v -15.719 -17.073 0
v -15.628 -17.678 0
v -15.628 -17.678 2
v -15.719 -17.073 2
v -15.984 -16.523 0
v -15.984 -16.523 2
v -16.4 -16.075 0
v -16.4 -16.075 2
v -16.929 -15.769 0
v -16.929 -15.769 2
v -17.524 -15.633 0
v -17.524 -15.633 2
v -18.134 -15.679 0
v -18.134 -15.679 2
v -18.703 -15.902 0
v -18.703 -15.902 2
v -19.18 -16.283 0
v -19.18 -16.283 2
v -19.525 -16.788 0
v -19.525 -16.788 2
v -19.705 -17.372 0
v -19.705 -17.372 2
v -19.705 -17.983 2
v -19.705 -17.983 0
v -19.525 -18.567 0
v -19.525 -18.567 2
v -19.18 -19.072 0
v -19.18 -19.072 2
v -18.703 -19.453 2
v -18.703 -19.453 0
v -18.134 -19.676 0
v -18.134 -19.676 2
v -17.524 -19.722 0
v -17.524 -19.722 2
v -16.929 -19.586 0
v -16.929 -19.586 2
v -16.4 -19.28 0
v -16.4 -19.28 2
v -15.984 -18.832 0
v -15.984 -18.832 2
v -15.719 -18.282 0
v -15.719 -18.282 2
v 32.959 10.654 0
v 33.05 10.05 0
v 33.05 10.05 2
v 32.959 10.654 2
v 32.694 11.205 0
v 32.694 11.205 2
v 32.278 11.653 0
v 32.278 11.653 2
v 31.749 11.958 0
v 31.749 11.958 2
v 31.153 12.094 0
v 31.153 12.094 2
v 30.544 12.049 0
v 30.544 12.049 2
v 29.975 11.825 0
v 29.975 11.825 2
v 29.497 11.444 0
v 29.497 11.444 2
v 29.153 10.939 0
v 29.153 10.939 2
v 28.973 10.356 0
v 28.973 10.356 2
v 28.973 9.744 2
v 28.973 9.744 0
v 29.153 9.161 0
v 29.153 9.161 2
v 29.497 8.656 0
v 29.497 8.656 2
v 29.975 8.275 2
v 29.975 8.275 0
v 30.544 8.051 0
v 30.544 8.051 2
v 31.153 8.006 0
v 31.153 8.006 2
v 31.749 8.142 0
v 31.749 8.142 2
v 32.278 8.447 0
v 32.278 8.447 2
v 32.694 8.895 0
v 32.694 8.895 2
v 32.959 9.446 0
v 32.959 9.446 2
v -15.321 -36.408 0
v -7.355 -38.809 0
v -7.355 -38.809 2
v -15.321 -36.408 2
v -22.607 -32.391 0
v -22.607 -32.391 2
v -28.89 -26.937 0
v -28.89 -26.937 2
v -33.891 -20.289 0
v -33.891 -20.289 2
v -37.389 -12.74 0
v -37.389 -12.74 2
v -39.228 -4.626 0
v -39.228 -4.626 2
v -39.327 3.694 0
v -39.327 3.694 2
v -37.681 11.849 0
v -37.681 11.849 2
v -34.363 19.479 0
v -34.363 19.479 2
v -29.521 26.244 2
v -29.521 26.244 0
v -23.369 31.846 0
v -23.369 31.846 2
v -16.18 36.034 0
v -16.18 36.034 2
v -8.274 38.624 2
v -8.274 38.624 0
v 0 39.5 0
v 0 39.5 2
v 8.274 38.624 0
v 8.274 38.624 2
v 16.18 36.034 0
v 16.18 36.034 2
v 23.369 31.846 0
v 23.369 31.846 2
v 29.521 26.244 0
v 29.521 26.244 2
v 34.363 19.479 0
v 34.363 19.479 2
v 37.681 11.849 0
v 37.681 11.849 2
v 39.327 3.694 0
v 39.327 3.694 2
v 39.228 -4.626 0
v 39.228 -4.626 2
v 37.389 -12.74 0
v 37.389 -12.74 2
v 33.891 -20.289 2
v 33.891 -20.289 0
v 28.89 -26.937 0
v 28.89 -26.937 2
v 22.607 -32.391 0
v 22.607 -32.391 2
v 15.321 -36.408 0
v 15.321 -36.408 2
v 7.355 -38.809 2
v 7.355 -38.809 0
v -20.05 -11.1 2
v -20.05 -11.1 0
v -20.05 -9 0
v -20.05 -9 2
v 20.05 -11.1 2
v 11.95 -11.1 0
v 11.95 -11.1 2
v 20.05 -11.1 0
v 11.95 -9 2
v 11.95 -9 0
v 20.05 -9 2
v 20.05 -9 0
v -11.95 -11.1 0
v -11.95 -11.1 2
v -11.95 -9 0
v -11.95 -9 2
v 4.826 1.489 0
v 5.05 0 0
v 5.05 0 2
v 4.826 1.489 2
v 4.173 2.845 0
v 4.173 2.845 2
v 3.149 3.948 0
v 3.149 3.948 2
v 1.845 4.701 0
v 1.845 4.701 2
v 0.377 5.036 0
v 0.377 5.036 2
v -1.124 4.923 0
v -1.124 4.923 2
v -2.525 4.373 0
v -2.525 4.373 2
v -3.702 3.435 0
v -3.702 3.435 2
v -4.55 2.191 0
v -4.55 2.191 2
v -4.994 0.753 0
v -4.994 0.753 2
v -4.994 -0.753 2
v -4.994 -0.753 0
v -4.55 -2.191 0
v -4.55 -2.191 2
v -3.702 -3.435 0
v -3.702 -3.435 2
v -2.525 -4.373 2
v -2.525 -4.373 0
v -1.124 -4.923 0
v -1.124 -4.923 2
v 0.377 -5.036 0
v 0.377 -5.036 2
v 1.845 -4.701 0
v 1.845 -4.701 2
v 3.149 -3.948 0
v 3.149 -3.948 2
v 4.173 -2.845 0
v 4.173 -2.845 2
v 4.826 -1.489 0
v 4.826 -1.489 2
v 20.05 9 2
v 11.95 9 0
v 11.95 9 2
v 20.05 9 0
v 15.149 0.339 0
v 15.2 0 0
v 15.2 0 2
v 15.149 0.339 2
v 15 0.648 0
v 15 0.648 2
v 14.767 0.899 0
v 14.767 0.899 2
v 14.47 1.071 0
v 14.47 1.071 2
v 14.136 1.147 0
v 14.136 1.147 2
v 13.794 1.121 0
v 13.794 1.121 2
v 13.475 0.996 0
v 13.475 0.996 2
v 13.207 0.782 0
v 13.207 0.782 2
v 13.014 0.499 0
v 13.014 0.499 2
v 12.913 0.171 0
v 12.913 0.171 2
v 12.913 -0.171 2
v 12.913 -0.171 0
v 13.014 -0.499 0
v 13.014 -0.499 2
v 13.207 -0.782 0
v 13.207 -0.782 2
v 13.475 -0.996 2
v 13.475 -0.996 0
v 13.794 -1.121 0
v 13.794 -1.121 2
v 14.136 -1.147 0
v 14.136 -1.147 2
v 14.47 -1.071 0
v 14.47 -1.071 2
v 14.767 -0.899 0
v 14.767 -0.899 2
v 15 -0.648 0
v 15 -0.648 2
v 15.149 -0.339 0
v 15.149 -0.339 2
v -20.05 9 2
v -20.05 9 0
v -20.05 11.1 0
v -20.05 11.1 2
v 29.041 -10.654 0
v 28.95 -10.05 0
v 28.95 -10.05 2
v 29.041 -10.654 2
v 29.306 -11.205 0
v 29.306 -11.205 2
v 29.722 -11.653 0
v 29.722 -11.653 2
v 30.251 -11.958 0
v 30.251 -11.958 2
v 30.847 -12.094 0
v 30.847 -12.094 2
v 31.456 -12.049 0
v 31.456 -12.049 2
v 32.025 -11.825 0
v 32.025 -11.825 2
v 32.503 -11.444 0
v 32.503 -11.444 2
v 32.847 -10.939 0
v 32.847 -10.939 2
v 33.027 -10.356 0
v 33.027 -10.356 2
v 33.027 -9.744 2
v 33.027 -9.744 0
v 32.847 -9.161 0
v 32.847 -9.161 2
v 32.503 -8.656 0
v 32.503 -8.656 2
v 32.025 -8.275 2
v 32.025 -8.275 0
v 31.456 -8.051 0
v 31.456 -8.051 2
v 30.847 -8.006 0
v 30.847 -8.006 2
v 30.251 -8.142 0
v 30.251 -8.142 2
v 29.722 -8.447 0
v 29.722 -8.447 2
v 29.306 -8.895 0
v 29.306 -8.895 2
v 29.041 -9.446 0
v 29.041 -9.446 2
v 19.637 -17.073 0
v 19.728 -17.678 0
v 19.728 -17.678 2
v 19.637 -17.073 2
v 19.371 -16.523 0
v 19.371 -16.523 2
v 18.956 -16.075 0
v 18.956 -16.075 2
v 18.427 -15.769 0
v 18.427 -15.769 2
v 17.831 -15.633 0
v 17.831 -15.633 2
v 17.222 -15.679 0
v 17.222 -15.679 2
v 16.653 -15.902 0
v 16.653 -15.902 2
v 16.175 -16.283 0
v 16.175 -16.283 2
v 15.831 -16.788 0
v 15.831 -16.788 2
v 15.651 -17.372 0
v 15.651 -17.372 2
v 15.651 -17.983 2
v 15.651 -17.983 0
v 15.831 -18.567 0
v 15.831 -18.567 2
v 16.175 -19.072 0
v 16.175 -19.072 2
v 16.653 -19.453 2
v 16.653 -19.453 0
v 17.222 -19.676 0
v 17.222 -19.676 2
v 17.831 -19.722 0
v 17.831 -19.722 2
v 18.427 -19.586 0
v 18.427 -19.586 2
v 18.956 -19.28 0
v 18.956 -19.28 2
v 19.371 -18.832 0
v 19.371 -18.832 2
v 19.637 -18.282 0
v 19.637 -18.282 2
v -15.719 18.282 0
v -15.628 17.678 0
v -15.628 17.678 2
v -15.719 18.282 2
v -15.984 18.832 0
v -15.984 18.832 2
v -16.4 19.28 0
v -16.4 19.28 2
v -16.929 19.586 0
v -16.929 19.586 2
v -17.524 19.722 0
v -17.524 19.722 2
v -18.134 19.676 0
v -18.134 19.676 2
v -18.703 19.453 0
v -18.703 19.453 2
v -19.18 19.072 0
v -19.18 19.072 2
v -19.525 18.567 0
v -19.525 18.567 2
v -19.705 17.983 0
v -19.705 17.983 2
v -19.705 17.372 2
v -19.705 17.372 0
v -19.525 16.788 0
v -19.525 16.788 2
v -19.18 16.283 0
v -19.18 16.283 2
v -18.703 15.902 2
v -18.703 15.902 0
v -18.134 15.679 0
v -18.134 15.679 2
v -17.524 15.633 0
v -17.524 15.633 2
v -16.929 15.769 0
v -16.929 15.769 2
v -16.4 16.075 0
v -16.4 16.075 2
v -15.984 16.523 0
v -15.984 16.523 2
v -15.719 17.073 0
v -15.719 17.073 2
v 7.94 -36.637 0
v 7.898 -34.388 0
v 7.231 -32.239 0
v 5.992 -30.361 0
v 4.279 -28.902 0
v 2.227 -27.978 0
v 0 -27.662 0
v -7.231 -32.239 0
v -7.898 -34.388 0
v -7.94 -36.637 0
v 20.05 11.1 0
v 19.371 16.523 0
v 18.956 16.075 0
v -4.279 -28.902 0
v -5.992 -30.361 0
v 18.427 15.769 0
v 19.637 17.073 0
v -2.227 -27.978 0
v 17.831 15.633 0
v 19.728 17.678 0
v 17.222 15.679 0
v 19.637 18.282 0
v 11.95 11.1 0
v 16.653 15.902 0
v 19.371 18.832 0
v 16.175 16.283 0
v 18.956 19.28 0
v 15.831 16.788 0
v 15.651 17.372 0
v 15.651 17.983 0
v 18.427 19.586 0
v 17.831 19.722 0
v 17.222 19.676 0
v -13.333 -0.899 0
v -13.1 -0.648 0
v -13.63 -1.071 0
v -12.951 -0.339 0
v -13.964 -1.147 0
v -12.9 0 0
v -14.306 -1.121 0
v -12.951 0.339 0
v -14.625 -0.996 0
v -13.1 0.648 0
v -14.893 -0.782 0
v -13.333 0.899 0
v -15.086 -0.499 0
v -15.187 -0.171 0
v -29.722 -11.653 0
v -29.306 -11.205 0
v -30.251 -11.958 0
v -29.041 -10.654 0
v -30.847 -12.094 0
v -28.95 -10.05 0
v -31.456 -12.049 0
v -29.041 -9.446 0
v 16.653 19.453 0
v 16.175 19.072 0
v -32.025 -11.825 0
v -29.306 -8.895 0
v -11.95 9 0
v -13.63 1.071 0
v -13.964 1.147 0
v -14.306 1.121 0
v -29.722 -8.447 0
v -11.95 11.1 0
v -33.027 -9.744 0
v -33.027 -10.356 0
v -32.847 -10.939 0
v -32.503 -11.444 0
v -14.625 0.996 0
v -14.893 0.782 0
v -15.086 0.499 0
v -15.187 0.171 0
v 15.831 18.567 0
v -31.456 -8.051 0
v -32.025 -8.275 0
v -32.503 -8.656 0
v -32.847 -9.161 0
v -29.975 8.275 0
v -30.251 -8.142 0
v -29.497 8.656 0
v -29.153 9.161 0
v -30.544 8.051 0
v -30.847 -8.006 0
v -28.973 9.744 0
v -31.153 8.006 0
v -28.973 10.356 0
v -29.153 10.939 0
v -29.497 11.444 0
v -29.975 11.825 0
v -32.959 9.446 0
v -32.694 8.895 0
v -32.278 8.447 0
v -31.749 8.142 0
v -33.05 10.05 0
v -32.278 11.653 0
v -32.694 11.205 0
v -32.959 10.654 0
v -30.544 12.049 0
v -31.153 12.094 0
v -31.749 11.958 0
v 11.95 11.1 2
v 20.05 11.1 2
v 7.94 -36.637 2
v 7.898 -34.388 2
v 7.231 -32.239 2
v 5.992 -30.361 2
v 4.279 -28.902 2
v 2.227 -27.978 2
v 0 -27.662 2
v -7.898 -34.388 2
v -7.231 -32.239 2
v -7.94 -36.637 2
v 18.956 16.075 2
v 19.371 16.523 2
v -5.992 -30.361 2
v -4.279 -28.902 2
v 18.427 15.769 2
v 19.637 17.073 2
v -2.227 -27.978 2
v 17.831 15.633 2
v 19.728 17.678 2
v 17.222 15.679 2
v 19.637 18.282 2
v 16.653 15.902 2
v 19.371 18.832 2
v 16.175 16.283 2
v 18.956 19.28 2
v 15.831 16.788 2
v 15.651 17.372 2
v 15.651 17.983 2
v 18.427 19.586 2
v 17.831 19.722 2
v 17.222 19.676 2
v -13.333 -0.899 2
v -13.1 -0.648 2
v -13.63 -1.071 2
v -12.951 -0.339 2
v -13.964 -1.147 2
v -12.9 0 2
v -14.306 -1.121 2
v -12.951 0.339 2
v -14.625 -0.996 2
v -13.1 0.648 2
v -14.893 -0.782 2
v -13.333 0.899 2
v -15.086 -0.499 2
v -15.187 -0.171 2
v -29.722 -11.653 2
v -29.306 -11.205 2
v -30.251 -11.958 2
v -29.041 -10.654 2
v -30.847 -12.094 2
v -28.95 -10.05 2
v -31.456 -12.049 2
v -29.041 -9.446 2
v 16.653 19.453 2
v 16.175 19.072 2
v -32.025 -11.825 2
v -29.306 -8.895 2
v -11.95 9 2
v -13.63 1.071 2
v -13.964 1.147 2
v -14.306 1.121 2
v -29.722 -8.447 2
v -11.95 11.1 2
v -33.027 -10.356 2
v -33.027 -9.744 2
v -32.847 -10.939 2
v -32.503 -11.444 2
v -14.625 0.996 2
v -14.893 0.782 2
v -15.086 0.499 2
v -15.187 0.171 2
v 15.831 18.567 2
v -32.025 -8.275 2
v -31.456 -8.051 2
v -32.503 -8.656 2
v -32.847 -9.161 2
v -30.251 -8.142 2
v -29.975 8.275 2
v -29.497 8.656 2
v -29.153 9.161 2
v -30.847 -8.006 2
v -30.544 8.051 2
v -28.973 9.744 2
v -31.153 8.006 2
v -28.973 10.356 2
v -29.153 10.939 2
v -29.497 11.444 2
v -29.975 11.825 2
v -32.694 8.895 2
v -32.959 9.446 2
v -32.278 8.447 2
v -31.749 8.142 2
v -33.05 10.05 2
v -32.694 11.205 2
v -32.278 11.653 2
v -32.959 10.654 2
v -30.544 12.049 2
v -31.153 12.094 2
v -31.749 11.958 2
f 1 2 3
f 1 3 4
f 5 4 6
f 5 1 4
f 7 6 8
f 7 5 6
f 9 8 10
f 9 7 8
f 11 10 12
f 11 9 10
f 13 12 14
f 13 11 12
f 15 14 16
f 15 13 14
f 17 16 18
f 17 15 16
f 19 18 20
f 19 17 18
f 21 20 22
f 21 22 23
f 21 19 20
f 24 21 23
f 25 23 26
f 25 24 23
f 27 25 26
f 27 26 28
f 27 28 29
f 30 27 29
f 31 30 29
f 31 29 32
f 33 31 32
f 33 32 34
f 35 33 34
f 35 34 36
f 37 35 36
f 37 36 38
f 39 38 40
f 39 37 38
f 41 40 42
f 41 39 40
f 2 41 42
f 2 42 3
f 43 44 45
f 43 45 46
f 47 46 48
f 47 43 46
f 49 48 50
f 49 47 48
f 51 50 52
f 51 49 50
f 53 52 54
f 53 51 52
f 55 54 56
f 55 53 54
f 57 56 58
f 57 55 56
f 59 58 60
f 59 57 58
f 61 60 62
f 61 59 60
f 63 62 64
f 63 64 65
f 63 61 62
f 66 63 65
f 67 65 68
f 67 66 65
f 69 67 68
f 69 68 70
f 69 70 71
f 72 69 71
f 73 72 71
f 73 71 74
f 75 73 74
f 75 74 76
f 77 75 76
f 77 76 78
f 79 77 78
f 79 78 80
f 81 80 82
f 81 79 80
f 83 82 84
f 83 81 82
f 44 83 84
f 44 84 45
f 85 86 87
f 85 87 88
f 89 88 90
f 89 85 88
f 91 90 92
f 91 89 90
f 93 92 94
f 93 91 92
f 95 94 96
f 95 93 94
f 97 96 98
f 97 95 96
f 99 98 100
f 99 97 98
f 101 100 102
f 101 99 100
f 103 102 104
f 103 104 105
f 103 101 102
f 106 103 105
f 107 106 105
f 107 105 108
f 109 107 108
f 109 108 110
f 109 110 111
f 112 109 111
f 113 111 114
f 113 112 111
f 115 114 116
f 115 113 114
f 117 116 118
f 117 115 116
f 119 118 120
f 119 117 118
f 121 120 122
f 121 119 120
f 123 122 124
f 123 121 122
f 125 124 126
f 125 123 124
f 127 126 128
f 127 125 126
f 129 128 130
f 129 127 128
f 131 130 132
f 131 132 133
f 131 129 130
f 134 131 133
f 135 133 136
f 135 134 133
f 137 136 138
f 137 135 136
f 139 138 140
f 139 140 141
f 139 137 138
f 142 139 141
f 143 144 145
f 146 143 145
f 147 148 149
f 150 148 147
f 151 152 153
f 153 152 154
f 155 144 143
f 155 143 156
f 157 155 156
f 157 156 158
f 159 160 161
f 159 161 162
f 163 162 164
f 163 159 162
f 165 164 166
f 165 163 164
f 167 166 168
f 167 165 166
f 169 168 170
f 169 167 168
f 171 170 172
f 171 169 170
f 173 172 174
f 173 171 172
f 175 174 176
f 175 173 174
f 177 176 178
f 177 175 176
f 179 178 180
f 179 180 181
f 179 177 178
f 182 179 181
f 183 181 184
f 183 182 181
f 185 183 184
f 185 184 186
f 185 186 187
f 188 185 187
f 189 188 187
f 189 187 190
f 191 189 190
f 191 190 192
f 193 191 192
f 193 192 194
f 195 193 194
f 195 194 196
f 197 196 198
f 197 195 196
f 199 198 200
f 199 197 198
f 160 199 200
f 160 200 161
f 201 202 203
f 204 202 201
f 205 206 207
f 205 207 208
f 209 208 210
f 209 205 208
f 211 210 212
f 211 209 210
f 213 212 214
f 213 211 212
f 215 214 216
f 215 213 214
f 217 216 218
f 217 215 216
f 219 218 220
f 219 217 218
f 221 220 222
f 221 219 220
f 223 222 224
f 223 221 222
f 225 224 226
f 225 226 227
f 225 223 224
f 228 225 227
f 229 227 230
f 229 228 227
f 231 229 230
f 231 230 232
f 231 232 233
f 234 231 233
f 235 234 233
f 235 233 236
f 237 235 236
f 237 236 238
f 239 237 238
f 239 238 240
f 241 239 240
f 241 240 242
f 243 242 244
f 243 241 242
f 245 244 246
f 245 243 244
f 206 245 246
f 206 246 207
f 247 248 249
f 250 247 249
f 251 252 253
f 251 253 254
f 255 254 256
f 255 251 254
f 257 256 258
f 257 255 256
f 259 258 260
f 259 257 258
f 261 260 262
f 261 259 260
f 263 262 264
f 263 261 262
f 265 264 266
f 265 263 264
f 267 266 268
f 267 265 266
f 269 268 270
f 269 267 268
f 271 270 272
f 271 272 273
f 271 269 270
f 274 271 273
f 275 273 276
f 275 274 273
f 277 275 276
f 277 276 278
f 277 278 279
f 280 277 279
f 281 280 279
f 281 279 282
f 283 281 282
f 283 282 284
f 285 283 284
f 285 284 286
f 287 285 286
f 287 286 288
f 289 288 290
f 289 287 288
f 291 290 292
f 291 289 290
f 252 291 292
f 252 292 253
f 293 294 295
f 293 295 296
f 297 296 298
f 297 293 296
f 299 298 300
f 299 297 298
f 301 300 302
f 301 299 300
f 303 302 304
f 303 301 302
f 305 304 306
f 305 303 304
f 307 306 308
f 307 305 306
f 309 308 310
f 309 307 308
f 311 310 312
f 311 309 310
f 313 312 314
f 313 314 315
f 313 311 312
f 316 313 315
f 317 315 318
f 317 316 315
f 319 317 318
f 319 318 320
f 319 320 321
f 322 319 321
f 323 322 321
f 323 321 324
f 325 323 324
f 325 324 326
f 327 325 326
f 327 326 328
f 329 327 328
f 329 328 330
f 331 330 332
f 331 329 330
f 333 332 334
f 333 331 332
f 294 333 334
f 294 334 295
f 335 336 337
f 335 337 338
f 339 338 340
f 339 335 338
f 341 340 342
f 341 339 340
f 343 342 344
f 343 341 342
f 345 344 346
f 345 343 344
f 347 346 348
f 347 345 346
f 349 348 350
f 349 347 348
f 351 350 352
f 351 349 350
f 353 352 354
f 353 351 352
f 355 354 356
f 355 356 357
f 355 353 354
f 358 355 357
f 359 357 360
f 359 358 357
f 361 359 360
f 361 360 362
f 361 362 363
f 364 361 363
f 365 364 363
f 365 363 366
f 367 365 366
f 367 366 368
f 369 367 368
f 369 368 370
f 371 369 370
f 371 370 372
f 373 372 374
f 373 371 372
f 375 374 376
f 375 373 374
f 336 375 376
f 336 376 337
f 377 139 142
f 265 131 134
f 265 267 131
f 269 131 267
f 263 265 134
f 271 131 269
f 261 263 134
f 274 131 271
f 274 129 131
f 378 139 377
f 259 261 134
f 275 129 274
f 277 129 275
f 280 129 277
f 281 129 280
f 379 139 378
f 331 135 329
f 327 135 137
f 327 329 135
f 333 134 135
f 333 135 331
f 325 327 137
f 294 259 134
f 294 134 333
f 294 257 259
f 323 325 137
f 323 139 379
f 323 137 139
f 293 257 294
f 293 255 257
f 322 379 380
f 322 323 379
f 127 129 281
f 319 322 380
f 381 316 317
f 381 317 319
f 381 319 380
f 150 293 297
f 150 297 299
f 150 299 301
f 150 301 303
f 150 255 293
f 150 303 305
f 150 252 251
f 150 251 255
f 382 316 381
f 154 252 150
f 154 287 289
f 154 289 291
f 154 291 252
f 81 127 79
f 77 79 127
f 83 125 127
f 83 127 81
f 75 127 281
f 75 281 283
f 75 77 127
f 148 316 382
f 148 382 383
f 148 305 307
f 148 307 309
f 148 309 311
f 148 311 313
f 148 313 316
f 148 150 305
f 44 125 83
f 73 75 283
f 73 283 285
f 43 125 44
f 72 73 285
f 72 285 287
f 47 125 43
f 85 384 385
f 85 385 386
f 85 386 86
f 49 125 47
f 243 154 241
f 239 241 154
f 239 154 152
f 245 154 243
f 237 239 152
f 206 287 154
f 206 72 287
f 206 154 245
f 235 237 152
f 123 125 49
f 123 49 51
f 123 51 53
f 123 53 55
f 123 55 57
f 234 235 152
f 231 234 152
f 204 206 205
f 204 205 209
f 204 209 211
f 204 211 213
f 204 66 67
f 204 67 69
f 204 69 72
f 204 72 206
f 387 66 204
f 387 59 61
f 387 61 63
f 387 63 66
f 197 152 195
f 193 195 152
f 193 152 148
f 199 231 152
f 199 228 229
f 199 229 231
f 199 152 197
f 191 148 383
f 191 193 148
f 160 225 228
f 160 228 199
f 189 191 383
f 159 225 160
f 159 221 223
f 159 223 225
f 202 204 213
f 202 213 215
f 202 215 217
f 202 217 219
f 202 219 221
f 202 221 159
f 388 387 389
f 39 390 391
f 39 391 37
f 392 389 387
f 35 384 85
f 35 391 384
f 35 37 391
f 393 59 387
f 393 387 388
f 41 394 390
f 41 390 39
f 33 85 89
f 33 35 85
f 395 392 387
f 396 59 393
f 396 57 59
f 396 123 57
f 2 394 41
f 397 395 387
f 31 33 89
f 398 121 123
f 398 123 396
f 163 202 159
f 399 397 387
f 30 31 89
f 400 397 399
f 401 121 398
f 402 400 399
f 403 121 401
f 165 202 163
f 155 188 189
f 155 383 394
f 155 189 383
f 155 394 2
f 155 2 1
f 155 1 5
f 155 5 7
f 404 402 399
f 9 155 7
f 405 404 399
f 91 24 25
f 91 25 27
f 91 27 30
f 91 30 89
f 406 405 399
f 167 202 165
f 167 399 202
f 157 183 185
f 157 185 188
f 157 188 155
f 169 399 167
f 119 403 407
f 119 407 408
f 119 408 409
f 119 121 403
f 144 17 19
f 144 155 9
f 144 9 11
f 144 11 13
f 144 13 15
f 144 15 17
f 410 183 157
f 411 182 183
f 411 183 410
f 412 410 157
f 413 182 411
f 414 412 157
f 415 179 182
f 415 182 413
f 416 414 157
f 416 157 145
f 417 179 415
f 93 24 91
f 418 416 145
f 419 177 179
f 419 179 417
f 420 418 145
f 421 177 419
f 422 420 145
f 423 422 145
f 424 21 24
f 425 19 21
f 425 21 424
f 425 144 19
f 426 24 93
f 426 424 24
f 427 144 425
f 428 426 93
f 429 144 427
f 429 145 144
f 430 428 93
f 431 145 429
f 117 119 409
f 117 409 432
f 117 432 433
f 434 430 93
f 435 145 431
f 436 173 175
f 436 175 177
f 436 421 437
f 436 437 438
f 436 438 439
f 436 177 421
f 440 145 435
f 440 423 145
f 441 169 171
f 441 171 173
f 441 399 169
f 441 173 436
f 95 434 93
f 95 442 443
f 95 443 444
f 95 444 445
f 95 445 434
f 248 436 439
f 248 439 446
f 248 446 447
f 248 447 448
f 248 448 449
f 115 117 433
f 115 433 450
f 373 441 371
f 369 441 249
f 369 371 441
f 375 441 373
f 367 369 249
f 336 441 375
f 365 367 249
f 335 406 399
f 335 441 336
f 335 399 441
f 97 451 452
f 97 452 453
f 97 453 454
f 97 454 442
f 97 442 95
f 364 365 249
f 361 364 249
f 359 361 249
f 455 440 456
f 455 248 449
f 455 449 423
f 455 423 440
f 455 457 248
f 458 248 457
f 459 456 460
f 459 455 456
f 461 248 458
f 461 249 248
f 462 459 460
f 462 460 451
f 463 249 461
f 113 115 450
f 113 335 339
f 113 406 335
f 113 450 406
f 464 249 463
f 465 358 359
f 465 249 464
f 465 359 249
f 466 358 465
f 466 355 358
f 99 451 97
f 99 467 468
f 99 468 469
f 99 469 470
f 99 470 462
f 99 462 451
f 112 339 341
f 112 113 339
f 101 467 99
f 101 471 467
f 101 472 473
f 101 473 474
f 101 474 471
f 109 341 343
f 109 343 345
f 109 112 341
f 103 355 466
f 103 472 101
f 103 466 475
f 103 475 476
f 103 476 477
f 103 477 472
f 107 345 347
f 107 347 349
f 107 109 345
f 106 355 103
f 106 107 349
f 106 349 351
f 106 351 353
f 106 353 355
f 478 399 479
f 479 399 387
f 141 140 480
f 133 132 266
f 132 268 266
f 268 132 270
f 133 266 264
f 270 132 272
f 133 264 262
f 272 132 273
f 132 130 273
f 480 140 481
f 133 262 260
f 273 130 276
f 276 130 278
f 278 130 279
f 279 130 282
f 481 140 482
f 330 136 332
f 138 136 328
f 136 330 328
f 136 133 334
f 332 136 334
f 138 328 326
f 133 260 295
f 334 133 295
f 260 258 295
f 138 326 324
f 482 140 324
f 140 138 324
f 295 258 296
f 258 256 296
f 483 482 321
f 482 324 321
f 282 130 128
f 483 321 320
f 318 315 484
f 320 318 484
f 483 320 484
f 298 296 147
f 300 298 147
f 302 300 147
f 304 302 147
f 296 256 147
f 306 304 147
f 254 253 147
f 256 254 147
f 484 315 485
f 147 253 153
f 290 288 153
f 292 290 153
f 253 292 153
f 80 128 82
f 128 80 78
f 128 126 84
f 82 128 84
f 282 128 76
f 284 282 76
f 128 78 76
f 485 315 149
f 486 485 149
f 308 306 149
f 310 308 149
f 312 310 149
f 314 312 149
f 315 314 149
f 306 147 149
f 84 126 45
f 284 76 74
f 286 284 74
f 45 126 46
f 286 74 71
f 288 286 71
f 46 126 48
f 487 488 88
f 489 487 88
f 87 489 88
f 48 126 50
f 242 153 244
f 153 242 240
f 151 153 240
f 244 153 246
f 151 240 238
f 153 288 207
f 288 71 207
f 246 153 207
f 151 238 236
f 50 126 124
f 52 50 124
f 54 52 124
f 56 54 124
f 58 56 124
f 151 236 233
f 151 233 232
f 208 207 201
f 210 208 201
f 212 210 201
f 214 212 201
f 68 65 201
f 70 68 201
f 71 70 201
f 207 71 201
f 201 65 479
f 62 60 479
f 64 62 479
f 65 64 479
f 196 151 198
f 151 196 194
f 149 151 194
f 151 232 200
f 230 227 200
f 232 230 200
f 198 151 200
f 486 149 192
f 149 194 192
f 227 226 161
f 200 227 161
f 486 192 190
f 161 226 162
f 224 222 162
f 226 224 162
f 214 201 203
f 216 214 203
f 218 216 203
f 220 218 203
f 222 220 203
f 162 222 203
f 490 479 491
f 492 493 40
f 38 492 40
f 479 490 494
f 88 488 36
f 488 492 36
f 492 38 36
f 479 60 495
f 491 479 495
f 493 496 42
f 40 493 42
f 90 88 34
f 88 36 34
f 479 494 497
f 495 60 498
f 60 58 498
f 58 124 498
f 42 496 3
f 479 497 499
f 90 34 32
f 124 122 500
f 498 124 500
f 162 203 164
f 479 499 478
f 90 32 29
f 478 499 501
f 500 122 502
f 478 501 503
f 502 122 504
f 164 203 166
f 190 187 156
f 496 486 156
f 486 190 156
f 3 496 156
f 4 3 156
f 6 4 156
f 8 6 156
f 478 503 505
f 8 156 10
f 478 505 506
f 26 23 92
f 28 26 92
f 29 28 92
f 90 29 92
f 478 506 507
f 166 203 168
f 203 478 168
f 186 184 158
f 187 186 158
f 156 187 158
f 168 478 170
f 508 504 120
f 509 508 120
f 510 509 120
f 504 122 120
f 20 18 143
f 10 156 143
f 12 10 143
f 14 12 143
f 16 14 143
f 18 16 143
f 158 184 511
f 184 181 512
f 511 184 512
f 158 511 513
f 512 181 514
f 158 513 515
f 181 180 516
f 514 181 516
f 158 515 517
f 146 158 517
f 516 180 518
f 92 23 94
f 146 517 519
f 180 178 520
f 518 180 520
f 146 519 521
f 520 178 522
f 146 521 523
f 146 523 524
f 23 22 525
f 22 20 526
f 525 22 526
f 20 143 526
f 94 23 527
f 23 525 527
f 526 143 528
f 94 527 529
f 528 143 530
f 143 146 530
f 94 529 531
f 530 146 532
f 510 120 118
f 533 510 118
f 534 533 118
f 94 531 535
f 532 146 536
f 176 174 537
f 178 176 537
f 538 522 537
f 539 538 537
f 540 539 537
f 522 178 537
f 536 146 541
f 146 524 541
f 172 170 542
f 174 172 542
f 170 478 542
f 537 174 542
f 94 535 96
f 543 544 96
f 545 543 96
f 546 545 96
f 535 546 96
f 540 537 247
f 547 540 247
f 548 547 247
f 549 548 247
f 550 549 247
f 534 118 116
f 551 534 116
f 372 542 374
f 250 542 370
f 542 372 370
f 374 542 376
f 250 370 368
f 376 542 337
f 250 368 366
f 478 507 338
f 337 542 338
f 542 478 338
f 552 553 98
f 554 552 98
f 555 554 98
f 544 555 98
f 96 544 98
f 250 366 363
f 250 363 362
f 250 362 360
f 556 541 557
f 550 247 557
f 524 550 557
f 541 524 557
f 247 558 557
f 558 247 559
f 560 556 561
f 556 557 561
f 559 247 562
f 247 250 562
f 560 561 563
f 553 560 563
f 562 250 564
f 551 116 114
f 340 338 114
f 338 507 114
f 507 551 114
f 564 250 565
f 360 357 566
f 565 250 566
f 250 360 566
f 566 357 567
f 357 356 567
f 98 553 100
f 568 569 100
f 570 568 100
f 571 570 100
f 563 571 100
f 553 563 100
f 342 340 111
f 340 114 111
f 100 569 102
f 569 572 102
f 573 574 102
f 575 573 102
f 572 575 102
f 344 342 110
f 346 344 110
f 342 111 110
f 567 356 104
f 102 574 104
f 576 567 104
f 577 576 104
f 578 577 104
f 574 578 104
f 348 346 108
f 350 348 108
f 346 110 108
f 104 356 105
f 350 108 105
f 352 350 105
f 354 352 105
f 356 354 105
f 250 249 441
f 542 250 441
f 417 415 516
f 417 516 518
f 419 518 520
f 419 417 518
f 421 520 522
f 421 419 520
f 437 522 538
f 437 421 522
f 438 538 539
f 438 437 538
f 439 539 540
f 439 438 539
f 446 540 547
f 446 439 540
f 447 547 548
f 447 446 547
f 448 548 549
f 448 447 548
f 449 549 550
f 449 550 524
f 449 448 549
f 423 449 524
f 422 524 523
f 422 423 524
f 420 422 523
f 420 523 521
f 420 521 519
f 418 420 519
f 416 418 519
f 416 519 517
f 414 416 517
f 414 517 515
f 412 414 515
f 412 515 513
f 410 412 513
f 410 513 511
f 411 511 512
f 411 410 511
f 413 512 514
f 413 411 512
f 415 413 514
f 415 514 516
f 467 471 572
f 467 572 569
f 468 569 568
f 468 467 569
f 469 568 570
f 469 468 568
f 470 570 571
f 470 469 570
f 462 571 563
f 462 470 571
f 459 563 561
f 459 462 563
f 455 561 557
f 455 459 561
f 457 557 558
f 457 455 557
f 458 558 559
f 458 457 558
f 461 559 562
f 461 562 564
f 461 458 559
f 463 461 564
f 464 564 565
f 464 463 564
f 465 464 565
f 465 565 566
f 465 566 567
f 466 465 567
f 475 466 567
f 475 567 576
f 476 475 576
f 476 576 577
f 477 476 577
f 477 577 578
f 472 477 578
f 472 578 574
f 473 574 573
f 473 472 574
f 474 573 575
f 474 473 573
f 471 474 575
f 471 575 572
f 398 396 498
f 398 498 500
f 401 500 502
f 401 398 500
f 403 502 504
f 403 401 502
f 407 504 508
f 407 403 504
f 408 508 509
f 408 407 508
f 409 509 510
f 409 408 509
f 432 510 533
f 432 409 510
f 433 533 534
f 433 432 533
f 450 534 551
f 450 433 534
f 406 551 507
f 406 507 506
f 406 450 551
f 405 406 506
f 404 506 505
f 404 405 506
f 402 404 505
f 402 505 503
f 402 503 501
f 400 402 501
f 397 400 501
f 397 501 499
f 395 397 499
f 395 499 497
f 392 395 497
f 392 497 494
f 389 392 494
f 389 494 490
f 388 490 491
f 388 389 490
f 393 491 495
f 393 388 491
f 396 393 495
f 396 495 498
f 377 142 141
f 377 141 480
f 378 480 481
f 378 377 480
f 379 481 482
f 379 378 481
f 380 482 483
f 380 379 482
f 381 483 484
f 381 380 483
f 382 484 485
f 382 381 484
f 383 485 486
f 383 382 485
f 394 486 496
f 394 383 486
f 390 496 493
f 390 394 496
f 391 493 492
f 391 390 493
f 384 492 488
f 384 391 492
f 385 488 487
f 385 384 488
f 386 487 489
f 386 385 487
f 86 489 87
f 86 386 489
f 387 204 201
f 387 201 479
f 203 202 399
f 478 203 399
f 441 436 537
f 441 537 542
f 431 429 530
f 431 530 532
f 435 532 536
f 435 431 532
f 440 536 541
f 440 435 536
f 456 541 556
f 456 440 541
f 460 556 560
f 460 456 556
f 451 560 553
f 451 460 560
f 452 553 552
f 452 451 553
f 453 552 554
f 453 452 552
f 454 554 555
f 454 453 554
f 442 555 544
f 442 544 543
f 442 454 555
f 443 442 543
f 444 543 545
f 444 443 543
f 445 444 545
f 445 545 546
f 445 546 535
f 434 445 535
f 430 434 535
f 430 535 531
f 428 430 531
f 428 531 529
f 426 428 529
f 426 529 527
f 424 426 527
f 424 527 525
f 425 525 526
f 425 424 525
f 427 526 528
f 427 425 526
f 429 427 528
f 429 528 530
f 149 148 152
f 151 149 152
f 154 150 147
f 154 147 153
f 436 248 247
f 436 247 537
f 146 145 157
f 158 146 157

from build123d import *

# Parameters (mm, degrees)
SKETCH_1_R      = 5.05
SKETCH_1_R_2    = 2.05
SKETCH_1_R_3    = 1.15
SKETCH_1_W      = 8.1
SKETCH_1_H      = 2.1
EXTRUDE_1_DEPTH = 2


with BuildPart() as part:
    # 草图1 → 凸台-拉伸1 (new body)
    with BuildSketch(Plane.XY):
        with BuildLine():
            ThreePointArc((-7.35497191, -38.809204942), (0, 39.5), (7.35497191, -38.809204942))
            ThreePointArc((7.35497191, -38.809204942), (0, -27.662081143), (-7.35497191, -38.809204942))
        make_face()
        Circle(SKETCH_1_R, mode=Mode.SUBTRACT)
        with Locations((-17.67766953, -17.67766953)):
            Circle(SKETCH_1_R_2, mode=Mode.SUBTRACT)
        with Locations((-17.67766953, 17.67766953)):
            Circle(SKETCH_1_R_2, mode=Mode.SUBTRACT)
        with Locations((17.67766953, 17.67766953)):
            Circle(SKETCH_1_R_2, mode=Mode.SUBTRACT)
        with Locations((17.67766953, -17.67766953)):
            Circle(SKETCH_1_R_2, mode=Mode.SUBTRACT)
        with Locations((31, 10.05)):
            Circle(SKETCH_1_R_2, mode=Mode.SUBTRACT)
        with Locations(Location((31, -10.05, 0), (0, 0, 180))):
            Circle(SKETCH_1_R_2, mode=Mode.SUBTRACT)
        with Locations((-31, -10.05)):
            Circle(SKETCH_1_R_2, mode=Mode.SUBTRACT)
        with Locations(Location((-31, 10.05, 0), (0, 0, 180))):
            Circle(SKETCH_1_R_2, mode=Mode.SUBTRACT)
        with Locations((-14.05, 0)):
            Circle(SKETCH_1_R_3, mode=Mode.SUBTRACT)
        with Locations((14.05, 0)):
            Circle(SKETCH_1_R_3, mode=Mode.SUBTRACT)
        with Locations((16, -10.05)):
            Rectangle(SKETCH_1_W, SKETCH_1_H, mode=Mode.SUBTRACT)
        with Locations((16, 10.05)):
            Rectangle(SKETCH_1_W, SKETCH_1_H, mode=Mode.SUBTRACT)
        with Locations((-16, 10.05)):
            Rectangle(SKETCH_1_W, SKETCH_1_H, mode=Mode.SUBTRACT)
        with Locations((-16, -10.05)):
            Rectangle(SKETCH_1_W, SKETCH_1_H, mode=Mode.SUBTRACT)
    extrude(amount=EXTRUDE_1_DEPTH)


solid = part.part
